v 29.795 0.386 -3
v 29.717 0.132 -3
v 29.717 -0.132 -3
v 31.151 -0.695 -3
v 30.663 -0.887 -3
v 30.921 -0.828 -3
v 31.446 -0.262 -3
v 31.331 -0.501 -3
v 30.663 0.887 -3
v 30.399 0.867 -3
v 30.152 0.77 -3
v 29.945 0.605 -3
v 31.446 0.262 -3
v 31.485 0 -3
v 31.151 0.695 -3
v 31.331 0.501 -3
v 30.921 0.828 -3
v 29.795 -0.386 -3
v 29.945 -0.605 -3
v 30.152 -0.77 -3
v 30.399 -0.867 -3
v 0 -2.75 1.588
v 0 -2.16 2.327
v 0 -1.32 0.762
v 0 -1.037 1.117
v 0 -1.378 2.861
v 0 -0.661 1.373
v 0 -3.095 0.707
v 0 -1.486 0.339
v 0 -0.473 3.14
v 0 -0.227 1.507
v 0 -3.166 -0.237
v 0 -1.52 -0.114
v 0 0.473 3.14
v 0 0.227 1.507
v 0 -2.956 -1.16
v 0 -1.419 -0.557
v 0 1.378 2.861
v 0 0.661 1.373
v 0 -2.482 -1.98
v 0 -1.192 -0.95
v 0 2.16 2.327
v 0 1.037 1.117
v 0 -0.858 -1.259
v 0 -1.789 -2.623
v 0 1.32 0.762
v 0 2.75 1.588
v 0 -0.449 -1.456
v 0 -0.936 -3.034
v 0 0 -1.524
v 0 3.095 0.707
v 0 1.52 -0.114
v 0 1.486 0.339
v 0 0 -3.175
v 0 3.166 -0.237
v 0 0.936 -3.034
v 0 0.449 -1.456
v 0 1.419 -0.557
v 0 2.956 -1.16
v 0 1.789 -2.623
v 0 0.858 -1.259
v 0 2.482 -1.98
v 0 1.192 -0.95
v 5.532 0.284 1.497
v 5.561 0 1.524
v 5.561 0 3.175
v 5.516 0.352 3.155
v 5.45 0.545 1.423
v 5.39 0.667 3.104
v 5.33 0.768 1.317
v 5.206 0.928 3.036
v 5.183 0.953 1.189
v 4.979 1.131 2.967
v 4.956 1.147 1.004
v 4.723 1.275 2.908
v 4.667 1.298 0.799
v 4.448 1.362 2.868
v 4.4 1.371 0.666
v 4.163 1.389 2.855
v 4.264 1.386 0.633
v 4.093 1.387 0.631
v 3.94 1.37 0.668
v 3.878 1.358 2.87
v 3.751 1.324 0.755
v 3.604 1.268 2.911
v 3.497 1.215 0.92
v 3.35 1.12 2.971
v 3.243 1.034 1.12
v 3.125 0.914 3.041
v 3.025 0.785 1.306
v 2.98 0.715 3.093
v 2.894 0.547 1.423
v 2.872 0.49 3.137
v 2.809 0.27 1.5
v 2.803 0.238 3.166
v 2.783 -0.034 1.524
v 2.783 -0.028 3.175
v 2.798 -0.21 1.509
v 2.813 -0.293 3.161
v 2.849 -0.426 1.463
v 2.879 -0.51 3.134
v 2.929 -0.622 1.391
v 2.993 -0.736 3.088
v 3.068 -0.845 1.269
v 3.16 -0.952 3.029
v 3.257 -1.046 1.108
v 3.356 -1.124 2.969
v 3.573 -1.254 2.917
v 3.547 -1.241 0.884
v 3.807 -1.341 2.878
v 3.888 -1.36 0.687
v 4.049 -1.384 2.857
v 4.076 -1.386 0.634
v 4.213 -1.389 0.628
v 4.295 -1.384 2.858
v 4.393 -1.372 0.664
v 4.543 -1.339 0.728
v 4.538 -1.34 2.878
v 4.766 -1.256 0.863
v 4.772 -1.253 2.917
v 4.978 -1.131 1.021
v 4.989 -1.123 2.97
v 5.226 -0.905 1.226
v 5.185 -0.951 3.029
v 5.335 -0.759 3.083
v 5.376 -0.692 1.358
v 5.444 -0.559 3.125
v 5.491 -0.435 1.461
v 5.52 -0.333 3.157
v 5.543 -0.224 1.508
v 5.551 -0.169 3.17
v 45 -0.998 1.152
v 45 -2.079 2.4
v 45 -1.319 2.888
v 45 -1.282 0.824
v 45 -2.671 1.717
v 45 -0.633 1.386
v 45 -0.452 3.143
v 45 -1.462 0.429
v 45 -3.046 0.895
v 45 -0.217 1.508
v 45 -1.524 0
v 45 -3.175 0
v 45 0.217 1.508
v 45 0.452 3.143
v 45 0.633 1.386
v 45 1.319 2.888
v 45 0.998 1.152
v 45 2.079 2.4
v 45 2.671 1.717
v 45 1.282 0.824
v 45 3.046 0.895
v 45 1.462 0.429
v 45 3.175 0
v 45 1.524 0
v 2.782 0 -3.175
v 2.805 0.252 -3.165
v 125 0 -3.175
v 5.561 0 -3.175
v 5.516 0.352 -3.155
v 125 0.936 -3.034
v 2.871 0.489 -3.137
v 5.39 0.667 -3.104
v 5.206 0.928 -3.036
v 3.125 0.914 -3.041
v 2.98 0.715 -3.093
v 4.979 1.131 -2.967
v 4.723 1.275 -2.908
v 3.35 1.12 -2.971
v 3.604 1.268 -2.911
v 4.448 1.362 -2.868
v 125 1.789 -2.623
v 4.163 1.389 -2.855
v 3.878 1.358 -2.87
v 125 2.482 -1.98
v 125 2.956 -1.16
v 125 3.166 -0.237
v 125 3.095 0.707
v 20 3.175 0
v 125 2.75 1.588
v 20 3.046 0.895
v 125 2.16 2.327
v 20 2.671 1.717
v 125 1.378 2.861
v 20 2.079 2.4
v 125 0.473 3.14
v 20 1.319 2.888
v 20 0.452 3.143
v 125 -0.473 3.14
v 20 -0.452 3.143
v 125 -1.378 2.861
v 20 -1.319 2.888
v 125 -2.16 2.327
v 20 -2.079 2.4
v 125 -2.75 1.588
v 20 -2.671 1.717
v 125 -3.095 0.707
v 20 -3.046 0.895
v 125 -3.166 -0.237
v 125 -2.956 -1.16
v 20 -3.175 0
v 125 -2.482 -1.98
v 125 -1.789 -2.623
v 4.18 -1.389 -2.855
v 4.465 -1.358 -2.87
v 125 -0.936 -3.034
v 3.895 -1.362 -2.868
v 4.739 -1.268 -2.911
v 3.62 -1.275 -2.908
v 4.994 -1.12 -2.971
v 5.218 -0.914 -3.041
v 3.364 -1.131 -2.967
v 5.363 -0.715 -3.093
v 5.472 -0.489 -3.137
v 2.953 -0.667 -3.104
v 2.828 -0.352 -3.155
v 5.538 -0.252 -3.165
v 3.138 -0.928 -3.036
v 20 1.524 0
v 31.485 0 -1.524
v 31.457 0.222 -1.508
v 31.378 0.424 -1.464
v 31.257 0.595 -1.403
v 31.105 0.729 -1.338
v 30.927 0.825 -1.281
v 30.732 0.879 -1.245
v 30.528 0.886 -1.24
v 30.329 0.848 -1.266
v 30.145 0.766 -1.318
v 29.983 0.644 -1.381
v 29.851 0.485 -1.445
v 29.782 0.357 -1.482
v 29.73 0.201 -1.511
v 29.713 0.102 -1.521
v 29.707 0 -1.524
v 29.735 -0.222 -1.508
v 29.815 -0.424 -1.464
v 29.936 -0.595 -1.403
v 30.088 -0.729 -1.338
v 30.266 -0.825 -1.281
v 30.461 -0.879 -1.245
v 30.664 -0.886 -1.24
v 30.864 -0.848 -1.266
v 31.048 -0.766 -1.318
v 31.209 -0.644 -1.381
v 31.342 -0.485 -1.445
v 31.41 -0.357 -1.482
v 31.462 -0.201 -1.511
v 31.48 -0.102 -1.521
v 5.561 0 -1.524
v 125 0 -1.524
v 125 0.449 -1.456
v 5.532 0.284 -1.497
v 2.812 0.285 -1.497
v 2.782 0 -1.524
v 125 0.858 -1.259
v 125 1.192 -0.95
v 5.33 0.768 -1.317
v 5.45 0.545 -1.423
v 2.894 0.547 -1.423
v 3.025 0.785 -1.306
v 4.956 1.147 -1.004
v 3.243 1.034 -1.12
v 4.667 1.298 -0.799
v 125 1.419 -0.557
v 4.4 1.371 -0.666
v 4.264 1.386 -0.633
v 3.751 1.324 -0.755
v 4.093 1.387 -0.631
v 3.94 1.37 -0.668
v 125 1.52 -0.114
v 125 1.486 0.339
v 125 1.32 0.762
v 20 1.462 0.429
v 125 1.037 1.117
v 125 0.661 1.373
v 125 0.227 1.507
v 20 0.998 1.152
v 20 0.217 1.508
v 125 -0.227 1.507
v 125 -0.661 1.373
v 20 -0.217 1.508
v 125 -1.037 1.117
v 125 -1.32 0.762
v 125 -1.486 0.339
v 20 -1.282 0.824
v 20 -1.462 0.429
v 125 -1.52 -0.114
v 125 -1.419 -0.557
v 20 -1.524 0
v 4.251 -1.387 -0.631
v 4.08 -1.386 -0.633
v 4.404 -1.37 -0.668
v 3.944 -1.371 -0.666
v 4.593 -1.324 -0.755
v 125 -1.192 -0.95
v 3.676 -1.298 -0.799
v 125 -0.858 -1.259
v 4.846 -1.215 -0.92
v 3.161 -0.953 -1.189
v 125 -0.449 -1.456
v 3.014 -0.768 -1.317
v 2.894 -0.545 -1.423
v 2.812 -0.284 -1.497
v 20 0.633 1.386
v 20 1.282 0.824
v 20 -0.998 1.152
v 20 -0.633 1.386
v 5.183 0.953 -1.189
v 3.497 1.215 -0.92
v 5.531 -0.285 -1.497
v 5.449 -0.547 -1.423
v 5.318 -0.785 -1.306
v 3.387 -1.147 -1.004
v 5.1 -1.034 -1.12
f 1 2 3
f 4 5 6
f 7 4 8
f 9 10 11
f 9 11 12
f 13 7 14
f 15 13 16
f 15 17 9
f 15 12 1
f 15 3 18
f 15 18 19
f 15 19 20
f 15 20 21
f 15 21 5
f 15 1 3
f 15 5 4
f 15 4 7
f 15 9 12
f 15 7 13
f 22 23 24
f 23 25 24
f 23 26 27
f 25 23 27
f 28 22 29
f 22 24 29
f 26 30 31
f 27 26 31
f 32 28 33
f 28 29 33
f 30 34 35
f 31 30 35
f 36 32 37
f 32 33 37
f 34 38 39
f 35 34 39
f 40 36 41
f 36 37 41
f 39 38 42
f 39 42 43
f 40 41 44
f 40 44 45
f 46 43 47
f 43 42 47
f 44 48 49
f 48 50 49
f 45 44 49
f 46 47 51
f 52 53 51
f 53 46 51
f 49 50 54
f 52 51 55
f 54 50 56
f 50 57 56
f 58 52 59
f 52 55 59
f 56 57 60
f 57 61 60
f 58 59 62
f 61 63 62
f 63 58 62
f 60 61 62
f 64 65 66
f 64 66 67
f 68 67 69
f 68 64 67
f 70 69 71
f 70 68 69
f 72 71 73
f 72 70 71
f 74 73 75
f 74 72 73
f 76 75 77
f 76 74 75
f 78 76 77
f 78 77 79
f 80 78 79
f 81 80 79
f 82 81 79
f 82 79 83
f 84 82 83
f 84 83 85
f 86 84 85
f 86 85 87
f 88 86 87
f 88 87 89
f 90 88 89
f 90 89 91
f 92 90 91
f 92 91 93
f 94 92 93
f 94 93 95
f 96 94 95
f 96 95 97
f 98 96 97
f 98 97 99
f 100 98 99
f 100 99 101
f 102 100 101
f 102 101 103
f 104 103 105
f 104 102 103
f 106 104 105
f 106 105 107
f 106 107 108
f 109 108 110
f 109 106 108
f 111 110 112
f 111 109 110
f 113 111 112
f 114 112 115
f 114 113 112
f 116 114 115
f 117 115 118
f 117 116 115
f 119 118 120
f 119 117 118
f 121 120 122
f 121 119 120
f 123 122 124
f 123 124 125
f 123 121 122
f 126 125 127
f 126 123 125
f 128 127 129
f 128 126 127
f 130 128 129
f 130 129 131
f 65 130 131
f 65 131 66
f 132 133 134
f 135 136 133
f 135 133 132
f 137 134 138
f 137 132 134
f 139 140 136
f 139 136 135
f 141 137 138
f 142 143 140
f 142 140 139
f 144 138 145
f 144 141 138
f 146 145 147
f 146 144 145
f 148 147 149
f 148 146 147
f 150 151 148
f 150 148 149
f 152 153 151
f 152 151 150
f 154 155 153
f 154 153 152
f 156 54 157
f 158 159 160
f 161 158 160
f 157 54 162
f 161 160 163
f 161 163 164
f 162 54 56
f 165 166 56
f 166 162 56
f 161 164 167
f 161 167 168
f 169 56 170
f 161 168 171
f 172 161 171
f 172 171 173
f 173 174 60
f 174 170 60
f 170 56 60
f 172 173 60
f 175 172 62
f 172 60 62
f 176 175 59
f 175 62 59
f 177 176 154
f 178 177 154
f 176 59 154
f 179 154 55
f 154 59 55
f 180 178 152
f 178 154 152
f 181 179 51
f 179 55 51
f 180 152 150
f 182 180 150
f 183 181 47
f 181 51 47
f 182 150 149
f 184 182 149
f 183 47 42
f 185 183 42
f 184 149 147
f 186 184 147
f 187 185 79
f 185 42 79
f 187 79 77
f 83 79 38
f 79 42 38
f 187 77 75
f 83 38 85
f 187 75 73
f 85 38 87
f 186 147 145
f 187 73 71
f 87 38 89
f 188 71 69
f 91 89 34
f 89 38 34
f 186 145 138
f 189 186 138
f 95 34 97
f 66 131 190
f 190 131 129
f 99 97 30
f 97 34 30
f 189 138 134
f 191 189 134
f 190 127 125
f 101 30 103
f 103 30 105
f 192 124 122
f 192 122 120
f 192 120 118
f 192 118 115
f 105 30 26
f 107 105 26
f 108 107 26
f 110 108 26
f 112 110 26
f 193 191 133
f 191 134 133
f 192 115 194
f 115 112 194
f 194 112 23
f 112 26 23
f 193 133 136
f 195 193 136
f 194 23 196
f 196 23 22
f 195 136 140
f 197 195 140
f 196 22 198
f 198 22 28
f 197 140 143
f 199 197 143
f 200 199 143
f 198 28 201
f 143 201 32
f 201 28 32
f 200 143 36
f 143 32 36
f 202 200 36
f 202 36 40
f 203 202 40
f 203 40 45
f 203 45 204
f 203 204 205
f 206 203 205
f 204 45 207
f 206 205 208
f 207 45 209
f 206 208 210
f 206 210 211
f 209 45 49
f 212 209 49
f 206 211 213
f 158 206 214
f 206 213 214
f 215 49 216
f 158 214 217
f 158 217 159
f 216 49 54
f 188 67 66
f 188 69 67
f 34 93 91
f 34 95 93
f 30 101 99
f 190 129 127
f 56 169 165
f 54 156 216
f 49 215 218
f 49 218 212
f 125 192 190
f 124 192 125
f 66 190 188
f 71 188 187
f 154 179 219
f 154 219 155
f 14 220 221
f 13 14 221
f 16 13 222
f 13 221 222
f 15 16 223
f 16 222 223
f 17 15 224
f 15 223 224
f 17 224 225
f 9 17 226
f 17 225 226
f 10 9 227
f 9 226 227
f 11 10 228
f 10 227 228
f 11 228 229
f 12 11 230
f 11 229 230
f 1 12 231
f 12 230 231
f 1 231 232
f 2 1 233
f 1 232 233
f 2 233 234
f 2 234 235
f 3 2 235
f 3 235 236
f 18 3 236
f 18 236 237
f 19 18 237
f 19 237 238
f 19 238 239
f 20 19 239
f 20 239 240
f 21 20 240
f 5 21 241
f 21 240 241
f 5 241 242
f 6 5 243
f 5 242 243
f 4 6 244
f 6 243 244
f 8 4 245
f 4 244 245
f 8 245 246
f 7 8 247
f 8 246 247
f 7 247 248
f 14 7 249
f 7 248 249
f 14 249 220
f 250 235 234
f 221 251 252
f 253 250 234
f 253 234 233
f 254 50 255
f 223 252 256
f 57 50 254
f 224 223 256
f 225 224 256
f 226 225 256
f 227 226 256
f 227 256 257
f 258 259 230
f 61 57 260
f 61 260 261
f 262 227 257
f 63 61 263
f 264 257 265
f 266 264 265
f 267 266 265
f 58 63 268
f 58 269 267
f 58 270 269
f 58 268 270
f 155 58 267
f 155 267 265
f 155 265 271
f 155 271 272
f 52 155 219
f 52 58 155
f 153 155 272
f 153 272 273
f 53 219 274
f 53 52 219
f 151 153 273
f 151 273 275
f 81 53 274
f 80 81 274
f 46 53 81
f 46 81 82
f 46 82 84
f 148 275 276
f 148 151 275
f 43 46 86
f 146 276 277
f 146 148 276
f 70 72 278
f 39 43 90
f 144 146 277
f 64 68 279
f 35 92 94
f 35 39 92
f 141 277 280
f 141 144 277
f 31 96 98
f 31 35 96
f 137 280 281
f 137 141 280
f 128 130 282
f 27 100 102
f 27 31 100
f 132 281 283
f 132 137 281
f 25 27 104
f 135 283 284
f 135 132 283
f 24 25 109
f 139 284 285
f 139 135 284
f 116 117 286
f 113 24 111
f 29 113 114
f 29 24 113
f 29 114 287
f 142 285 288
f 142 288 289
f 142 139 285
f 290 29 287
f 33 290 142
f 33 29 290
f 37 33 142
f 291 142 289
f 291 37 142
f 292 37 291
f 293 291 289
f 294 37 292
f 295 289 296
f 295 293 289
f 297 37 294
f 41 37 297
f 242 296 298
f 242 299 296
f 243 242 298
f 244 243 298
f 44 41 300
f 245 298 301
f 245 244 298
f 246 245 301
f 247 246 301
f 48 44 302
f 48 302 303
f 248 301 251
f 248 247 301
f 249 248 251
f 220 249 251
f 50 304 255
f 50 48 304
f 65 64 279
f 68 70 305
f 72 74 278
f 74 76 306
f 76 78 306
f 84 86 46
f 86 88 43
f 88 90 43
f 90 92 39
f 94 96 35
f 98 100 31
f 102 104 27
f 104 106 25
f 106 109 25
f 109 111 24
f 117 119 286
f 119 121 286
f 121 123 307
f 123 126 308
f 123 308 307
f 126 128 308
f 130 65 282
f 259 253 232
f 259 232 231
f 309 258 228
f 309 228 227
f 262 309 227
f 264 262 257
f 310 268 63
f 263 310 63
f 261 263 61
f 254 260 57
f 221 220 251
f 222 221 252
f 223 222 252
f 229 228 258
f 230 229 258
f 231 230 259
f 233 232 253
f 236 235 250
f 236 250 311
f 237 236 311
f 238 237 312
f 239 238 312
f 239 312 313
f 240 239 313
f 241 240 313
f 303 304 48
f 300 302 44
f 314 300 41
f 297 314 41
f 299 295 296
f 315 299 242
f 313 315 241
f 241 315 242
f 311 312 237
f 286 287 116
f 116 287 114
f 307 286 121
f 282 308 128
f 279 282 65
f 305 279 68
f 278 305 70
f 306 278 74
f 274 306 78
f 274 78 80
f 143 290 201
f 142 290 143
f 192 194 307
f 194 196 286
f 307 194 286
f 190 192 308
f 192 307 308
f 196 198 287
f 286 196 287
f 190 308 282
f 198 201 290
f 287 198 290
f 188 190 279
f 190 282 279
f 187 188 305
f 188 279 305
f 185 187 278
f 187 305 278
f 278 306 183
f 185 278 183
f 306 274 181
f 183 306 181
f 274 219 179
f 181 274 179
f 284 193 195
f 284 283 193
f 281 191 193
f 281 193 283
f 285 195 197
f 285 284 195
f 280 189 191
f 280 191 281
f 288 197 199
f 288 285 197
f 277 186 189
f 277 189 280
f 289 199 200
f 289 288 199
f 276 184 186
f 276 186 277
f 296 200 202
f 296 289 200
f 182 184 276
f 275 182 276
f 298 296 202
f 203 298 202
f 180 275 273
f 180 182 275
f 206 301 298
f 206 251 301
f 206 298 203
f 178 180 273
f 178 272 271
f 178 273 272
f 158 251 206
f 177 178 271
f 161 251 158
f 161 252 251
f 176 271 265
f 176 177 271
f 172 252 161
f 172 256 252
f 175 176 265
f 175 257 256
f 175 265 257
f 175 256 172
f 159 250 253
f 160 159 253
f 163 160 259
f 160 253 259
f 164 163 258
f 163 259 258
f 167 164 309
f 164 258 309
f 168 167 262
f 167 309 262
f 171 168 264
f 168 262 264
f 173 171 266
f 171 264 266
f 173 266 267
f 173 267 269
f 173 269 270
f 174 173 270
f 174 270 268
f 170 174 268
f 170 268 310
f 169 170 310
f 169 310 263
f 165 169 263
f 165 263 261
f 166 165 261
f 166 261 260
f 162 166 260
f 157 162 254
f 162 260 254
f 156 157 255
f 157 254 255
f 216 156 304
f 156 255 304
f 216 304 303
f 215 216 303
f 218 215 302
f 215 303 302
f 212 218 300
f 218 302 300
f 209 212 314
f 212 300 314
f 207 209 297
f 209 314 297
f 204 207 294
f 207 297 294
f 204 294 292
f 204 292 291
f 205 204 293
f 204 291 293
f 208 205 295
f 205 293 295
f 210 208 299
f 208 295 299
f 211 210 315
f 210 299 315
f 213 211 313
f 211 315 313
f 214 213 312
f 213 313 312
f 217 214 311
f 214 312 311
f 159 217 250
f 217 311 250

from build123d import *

# Parameters (mm, degrees)
SKETCH1_R                                            = 3.175
SKETCH1_R_2                                          = 1.524
BOSS_EXTRUDE1_DEPTH                                  = 125
F_5_40_HOLE_FOR_SET_SCREW_ATTACHING_SHAFT_DEPTH      = 10
F_5_40_HOLE_FOR_SET_SCREW_ATTACHING_SHAFT_DEPTH_BACK = 10
SKETCH2_R                                            = 1.38938
SKETCH3_W                                            = 25
SKETCH3_H                                            = 14.833516594
CUT_EXTRUDE2_DEPTH                                   = 126.080619107
SKETCH4_R                                            = 0.889
CUT_EXTRUDE3_DEPTH                                   = 3


with BuildPart() as part:
    # Sketch1 → Boss-Extrude1 (new body)
    with BuildSketch(Plane(origin=(0, 0, 0), x_dir=(0, 0, -1), z_dir=(1, 0, 0))):
        Circle(SKETCH1_R)
        Circle(SKETCH1_R_2, mode=Mode.SUBTRACT)
    extrude(amount=BOSS_EXTRUDE1_DEPTH)

    # Sketch2 → 5-40 hole for set screw attaching shaft (cut, two sides: drawn at the far end of the back side and taken through both)
    with BuildSketch(Plane.XY.offset(-F_5_40_HOLE_FOR_SET_SCREW_ATTACHING_SHAFT_DEPTH_BACK)):
        with Locations((4.171703898, 0)):
            Circle(SKETCH2_R)
    extrude(amount=F_5_40_HOLE_FOR_SET_SCREW_ATTACHING_SHAFT_DEPTH + F_5_40_HOLE_FOR_SET_SCREW_ATTACHING_SHAFT_DEPTH_BACK, mode=Mode.SUBTRACT)

    # Sketch3 → Cut-Extrude2 (cut, through all)
    with BuildSketch(Plane.XY):
        with Locations((32.5, -1.779757755)):
            Rectangle(SKETCH3_W, SKETCH3_H)
    extrude(amount=CUT_EXTRUDE2_DEPTH, mode=Mode.SUBTRACT)

    # Sketch4 → Cut-Extrude3 (cut)
    with BuildSketch(Plane.XY):
        with Locations((30.5963642, 0)):
            Circle(SKETCH4_R)
    extrude(amount=-CUT_EXTRUDE3_DEPTH, mode=Mode.SUBTRACT)


solid = part.part
